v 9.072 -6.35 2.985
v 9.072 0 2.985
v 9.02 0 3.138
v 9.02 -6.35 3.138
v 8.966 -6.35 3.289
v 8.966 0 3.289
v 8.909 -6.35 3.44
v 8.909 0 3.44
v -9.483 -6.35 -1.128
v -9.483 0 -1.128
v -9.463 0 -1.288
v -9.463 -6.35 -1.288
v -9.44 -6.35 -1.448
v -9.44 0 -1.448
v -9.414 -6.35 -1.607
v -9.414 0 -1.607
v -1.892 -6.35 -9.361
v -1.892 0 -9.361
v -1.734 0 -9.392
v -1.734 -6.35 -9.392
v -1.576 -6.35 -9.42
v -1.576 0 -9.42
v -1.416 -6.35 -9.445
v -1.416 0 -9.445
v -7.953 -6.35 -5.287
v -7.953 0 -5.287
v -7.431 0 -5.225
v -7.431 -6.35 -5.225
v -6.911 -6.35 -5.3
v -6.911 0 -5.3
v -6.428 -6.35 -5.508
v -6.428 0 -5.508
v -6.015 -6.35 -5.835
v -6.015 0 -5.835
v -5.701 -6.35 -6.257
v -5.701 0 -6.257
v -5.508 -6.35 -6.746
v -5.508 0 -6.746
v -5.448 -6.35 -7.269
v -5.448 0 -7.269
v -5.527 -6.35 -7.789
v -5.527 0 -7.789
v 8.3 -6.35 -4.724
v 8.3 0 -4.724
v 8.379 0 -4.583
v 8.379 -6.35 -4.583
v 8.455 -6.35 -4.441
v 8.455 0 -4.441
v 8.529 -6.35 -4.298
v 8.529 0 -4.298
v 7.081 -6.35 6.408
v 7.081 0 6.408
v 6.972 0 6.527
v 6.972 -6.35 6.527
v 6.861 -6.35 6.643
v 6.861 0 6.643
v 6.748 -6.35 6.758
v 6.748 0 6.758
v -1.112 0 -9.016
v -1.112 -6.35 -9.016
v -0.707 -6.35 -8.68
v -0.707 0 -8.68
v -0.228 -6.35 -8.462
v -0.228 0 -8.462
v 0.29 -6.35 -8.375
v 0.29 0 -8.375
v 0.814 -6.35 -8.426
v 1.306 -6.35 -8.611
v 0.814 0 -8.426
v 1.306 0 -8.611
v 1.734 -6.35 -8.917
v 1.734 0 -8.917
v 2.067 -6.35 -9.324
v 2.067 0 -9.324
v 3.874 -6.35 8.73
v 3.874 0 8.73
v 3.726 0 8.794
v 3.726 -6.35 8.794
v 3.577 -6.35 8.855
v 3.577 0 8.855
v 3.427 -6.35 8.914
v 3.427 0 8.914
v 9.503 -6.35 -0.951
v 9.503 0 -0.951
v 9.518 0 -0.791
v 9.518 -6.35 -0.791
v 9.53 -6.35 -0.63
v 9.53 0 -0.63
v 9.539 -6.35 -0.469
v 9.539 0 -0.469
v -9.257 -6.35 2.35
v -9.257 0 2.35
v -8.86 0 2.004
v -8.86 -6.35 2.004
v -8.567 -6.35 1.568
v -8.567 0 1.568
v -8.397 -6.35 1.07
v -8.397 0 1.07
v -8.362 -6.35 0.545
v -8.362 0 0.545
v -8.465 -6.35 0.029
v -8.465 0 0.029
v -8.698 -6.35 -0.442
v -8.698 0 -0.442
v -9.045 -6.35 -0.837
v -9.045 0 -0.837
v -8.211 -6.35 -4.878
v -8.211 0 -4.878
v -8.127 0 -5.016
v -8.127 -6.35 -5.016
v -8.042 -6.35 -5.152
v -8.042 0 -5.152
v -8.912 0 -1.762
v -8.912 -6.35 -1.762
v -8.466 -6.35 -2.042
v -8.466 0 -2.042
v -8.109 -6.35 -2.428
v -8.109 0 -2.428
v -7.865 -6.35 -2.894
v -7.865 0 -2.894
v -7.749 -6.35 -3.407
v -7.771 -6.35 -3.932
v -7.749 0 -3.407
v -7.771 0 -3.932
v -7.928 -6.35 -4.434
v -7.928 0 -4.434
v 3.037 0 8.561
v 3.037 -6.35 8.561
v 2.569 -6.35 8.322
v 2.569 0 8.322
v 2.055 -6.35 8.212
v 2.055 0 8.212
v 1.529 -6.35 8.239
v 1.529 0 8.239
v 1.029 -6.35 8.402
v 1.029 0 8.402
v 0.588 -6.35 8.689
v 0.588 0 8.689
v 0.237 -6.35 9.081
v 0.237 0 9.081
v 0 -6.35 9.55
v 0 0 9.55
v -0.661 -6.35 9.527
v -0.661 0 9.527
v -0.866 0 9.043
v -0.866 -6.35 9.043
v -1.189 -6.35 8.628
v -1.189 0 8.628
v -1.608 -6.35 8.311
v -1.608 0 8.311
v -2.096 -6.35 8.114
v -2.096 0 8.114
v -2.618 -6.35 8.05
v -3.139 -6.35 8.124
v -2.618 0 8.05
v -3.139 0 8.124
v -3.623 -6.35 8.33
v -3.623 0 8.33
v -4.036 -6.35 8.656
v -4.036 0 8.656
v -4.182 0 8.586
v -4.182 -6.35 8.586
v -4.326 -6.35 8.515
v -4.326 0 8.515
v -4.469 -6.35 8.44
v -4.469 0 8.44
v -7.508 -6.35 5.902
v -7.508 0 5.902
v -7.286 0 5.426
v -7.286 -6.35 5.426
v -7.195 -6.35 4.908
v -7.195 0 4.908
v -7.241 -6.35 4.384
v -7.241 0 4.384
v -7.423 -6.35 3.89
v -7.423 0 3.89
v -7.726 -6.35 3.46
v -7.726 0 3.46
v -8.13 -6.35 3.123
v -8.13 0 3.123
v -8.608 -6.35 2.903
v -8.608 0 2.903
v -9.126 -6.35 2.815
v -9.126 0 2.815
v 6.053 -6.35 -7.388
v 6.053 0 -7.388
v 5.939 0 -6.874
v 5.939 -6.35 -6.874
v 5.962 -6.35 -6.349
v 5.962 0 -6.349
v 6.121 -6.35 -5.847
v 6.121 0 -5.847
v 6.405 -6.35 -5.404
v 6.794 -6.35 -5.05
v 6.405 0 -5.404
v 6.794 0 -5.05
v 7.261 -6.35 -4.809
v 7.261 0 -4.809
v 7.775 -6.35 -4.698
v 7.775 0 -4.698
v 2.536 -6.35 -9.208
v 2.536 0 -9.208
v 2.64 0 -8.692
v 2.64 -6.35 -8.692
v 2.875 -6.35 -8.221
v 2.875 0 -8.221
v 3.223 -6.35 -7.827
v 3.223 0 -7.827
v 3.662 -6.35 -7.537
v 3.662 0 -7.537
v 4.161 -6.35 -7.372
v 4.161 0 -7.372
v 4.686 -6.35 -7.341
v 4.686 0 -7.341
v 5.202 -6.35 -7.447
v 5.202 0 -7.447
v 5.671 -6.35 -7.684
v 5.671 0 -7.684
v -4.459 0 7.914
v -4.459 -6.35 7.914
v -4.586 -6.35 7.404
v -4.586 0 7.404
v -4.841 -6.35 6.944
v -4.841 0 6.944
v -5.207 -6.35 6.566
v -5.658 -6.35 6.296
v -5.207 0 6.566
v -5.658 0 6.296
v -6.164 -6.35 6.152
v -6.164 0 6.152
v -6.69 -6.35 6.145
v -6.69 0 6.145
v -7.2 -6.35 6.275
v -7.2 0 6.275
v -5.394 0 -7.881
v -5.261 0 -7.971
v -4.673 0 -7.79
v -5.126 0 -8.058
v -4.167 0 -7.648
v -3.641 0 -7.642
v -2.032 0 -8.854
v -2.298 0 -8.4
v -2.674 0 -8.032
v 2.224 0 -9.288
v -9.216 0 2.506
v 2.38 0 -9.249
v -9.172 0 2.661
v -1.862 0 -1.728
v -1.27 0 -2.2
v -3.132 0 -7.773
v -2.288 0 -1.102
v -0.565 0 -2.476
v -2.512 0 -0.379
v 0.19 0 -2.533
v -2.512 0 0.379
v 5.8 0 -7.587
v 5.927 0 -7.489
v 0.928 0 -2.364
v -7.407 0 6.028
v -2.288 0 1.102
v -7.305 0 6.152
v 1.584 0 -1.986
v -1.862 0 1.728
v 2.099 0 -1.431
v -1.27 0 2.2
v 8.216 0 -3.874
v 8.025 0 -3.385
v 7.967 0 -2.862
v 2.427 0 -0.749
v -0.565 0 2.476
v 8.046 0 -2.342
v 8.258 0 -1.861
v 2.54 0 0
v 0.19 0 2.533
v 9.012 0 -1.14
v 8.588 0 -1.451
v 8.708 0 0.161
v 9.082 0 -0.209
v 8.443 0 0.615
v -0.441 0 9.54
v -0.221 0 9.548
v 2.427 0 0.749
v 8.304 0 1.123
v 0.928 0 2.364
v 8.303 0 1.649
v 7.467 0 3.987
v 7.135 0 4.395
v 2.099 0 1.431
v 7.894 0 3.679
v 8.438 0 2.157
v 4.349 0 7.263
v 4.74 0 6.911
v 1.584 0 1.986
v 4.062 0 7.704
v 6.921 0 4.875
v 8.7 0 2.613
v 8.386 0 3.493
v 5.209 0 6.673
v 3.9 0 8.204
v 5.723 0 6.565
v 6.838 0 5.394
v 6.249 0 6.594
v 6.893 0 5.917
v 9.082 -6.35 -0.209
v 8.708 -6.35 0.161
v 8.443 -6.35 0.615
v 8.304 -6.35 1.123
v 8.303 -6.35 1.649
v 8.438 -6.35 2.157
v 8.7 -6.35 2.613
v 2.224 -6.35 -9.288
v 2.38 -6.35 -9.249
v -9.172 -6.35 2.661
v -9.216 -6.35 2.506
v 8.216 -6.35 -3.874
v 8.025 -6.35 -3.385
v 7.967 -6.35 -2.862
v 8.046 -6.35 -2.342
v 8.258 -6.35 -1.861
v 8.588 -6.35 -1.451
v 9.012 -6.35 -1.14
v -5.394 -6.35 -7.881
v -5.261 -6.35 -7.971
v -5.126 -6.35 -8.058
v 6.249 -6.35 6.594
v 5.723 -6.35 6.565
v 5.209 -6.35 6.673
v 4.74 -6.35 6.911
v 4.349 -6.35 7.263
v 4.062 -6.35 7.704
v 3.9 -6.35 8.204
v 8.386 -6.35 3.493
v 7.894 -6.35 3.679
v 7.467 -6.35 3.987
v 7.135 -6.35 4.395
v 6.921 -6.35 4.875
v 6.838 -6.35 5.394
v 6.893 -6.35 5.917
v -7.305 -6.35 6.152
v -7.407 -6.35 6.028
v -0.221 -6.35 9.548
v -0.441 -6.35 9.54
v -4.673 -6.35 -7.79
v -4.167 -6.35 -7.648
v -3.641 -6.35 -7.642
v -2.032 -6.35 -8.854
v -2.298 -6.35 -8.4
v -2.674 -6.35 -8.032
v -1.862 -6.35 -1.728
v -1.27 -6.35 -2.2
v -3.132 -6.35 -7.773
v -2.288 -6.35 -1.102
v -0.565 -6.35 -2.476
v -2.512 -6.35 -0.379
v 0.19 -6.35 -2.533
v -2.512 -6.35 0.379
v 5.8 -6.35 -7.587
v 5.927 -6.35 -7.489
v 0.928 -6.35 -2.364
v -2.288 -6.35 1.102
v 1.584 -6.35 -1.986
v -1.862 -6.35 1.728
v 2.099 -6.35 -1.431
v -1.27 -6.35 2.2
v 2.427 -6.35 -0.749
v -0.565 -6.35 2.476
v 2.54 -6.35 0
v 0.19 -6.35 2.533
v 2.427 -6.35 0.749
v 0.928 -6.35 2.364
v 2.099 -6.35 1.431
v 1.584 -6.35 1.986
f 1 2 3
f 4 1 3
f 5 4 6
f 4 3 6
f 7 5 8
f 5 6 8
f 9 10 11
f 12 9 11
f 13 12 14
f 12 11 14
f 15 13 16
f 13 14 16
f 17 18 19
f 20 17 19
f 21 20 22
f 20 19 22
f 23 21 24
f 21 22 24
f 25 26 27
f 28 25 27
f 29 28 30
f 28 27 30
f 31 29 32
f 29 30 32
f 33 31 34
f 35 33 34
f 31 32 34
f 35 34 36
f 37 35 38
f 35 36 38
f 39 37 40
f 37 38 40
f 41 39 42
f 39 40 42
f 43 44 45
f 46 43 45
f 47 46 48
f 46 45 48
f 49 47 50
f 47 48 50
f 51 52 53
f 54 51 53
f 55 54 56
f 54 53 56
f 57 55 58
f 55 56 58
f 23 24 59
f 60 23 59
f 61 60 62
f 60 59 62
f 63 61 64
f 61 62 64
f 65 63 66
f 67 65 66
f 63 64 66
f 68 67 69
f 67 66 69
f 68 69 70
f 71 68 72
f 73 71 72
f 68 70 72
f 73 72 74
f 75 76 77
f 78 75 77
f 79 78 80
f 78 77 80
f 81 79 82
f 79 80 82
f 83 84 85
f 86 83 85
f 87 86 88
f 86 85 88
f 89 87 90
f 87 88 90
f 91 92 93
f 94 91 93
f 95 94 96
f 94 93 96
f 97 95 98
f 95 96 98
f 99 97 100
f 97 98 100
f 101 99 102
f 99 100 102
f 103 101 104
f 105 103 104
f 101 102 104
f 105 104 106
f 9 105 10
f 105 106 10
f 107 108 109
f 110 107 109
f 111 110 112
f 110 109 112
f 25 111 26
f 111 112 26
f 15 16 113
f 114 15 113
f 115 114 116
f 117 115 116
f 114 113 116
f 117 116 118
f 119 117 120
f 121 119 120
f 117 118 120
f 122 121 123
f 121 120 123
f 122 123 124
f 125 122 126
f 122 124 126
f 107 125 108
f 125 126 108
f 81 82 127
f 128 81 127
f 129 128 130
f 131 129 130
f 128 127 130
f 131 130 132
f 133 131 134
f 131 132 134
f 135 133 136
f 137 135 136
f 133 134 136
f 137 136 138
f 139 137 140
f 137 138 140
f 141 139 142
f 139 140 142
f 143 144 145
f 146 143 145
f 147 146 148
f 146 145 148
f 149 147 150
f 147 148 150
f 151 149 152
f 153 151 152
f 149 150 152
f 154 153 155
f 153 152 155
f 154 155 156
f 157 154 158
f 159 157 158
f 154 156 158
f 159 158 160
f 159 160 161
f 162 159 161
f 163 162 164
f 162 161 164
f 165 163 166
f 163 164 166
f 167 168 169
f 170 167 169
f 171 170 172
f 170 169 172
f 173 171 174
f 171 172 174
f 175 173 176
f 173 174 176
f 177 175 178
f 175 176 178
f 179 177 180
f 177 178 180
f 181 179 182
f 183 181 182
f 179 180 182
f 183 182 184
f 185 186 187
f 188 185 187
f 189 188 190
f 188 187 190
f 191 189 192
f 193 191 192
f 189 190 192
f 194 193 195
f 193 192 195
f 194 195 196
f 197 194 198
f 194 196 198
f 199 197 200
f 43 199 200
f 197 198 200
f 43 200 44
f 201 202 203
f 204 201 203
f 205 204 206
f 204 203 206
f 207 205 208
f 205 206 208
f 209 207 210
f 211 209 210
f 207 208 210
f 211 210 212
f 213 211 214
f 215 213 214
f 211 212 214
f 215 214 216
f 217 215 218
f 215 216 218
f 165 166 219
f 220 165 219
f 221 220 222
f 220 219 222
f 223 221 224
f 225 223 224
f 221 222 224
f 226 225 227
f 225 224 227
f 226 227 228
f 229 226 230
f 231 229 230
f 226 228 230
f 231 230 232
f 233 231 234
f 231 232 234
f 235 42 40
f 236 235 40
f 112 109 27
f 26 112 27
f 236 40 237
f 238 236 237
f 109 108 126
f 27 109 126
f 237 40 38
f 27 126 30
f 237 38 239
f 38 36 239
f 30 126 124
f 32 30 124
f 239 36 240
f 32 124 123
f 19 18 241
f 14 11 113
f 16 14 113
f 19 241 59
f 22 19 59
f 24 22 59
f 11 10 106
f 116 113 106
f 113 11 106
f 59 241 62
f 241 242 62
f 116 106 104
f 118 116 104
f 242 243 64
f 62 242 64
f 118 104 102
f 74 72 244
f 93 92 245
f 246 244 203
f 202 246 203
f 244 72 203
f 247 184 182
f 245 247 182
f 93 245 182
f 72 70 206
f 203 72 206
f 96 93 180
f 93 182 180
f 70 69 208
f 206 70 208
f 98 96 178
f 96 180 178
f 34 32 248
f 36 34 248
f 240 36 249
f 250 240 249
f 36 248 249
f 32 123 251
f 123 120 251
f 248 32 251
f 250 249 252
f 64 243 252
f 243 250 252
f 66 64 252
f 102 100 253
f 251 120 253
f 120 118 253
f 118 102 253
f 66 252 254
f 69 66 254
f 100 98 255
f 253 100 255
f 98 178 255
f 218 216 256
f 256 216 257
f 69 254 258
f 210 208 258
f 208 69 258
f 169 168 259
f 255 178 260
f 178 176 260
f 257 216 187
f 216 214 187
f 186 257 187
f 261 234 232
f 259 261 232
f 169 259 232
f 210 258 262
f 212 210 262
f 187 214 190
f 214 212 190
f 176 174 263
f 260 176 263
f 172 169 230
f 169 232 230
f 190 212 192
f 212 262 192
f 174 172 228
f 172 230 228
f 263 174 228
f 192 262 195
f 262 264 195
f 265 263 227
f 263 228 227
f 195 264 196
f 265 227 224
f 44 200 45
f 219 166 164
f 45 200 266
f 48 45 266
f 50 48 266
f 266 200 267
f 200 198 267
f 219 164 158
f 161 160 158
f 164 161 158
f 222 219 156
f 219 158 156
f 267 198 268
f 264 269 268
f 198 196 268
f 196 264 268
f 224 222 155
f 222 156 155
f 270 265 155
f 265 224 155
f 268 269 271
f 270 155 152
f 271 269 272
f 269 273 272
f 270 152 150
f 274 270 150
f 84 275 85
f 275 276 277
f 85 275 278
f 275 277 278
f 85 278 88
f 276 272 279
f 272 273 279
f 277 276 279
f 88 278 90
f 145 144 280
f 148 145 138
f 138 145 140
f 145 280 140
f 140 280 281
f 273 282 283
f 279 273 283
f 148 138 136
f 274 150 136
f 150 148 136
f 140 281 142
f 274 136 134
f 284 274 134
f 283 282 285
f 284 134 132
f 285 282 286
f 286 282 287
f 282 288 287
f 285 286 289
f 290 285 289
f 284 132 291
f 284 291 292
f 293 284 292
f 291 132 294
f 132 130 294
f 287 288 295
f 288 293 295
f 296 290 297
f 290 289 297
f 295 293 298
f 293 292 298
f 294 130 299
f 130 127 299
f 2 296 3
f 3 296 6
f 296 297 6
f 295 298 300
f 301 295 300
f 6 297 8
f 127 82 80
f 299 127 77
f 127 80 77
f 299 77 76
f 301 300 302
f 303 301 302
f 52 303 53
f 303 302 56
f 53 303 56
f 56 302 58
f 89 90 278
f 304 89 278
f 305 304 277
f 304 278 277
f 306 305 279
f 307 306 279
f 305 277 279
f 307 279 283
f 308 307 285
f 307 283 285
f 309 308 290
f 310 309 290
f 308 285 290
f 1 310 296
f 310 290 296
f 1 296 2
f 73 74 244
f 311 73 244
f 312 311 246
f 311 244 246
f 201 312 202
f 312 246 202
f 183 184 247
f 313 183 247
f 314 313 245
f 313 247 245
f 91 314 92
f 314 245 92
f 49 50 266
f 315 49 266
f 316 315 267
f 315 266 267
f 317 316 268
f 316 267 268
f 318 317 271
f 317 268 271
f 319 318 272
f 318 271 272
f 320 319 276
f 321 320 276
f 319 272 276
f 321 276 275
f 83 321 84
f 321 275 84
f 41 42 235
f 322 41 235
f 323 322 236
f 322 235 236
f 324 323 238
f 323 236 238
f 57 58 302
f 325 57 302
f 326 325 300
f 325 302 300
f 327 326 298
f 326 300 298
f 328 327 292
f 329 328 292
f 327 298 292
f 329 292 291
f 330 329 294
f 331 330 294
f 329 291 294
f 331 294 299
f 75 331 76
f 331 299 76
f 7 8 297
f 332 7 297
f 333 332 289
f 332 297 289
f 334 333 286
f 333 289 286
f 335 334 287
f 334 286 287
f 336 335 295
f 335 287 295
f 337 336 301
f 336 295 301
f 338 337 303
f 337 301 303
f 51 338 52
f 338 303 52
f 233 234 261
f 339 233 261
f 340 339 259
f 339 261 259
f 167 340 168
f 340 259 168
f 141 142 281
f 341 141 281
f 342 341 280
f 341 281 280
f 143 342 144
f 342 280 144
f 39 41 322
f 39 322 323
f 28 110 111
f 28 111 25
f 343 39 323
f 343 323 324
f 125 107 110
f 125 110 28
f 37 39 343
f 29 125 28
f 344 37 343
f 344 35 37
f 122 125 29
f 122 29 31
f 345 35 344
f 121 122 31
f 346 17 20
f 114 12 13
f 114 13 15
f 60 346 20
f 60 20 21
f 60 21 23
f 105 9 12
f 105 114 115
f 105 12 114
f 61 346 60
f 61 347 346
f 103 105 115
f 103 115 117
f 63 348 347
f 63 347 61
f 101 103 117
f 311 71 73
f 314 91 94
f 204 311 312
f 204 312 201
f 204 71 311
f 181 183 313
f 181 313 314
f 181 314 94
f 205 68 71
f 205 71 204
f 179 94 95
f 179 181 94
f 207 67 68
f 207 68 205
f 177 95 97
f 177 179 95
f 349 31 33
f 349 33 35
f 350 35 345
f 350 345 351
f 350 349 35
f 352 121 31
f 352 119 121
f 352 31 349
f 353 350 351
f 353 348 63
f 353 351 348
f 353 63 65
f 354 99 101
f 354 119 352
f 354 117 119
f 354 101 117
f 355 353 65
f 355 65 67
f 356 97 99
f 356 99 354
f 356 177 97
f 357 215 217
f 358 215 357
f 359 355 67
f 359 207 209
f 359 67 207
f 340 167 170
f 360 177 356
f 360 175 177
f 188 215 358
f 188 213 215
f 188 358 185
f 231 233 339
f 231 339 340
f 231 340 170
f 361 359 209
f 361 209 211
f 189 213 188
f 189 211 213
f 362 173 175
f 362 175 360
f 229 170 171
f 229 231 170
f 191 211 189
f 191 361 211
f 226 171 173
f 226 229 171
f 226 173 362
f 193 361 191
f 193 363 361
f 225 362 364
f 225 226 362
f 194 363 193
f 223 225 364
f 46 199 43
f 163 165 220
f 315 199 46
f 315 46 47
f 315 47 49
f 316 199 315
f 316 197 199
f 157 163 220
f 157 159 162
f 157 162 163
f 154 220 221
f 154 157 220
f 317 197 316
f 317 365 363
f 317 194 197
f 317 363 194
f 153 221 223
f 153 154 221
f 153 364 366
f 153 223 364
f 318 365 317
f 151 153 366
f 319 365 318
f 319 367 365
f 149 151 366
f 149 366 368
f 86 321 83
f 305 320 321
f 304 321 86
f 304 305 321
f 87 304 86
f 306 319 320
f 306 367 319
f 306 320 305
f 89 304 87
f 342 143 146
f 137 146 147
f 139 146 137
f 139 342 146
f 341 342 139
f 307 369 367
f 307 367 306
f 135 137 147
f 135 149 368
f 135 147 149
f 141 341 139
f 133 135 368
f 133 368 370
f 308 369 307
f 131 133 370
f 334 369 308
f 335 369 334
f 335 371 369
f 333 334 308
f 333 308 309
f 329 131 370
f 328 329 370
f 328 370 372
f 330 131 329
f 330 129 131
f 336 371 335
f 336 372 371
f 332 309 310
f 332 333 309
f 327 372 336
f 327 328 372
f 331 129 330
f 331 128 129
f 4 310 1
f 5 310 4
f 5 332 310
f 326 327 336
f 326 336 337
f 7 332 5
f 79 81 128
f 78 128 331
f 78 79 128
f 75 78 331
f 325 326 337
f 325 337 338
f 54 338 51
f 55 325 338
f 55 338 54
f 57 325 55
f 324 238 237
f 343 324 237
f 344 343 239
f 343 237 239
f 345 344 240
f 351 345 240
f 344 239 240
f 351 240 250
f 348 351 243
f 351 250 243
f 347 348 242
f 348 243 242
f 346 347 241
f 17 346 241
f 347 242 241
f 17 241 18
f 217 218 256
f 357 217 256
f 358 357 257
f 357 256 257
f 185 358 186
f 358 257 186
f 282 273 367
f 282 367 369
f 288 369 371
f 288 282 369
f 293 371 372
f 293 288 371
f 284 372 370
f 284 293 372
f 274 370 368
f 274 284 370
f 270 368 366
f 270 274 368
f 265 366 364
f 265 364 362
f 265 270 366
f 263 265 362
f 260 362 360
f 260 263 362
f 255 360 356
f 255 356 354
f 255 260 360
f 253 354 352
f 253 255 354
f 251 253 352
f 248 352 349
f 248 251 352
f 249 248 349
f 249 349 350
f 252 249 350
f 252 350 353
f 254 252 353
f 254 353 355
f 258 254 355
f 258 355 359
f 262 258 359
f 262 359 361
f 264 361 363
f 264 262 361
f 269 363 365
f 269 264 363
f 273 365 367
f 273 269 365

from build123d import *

# Parameters (mm, degrees)
F0_R     = 2.54
F1_DEPTH = 6.35


with BuildPart() as f1:
    # F0 (on Front) → F1 (new body)
    with BuildSketch(Plane.XZ):
        with BuildLine():
            ThreePointArc((-4.468796, 8.440379), (-5.206836, 6.566125), (-7.199962, 6.274607))
            ThreePointArc((-7.199962, 6.274607), (-7.356389, 6.090459), (-7.508107, 5.902412))
            ThreePointArc((-7.508107, 5.902412), (-7.422522, 3.889899), (-9.126103, 2.81503))
            ThreePointArc((-9.126103, 2.81503), (-9.194395, 2.583262), (-9.256802, 2.349841))
            ThreePointArc((-9.256802, 2.349841), (-8.362303, 0.545014), (-9.483499, -1.128441))
            ThreePointArc((-9.483499, -1.128441), (-9.451918, -1.367987), (-9.414286, -1.606659))
            ThreePointArc((-9.414286, -1.606659), (-7.864634, -2.893558), (-8.210717, -4.877936))
            ThreePointArc((-8.210717, -4.877936), (-8.08469, -5.084085), (-7.953489, -5.28698))
            ThreePointArc((-7.953489, -5.28698), (-6.015063, -5.834737), (-5.526542, -7.788933))
            ThreePointArc((-5.526542, -7.788933), (-5.327734, -7.926247), (-5.125515, -8.058488))
            ThreePointArc((-5.125515, -8.058488), (-3.131525, -7.772946), (-1.892375, -9.361039))
            ThreePointArc((-1.892375, -9.361039), (-1.654959, -9.405916), (-1.416485, -9.444772))
            ThreePointArc((-1.416485, -9.444772), (0.290311, -8.375014), (2.067085, -9.324017))
            ThreePointArc((2.067085, -9.324017), (2.302297, -9.268742), (2.536035, -9.207533))
            ThreePointArc((2.536035, -9.207533), (3.662244, -7.537447), (5.67122, -7.684231))
            ThreePointArc((5.67122, -7.684231), (5.863796, -7.538304), (6.052619, -7.387553))
            ThreePointArc((6.052619, -7.387553), (6.40465, -5.404221), (8.300493, -4.723552))
            ThreePointArc((8.300493, -4.723552), (8.417331, -4.51206), (8.52878, -4.297679))
            ThreePointArc((8.52878, -4.297679), (8.04612, -2.342028), (9.502942, -0.950913))
            ThreePointArc((9.502942, -0.950913), (9.523956, -0.710209), (9.538875, -0.46905))
            ThreePointArc((9.538875, -0.46905), (8.304491, 1.122751), (9.071869, 2.985185))
            ThreePointArc((9.071869, 2.985185), (8.993448, 3.213725), (8.909271, 3.440207))
            ThreePointArc((8.909271, 3.440207), (7.13535, 4.394533), (7.081375, 6.408141))
            ThreePointArc((7.081375, 6.408141), (6.916999, 6.585231), (6.748196, 6.758105))
            ThreePointArc((6.748196, 6.758105), (4.739669, 6.91091), (3.873618, 8.72956))
            ThreePointArc((3.873618, 8.72956), (3.651543, 8.824759), (3.427131, 8.91431))
            ThreePointArc((3.427131, 8.91431), (1.529255, 8.239328), (0, 9.5504))
            ThreePointArc((0, 9.5504), (-0.330856, 9.544667), (-0.661315, 9.527476))
            ThreePointArc((-0.661315, 9.527476), (-2.096114, 8.113658), (-4.036173, 8.655602))
            ThreePointArc((-4.036173, 8.655602), (-4.253846, 8.550727), (-4.468796, 8.440379))
        make_face()
        Circle(F0_R, mode=Mode.SUBTRACT)
    extrude(amount=F1_DEPTH)


solid = f1.part
